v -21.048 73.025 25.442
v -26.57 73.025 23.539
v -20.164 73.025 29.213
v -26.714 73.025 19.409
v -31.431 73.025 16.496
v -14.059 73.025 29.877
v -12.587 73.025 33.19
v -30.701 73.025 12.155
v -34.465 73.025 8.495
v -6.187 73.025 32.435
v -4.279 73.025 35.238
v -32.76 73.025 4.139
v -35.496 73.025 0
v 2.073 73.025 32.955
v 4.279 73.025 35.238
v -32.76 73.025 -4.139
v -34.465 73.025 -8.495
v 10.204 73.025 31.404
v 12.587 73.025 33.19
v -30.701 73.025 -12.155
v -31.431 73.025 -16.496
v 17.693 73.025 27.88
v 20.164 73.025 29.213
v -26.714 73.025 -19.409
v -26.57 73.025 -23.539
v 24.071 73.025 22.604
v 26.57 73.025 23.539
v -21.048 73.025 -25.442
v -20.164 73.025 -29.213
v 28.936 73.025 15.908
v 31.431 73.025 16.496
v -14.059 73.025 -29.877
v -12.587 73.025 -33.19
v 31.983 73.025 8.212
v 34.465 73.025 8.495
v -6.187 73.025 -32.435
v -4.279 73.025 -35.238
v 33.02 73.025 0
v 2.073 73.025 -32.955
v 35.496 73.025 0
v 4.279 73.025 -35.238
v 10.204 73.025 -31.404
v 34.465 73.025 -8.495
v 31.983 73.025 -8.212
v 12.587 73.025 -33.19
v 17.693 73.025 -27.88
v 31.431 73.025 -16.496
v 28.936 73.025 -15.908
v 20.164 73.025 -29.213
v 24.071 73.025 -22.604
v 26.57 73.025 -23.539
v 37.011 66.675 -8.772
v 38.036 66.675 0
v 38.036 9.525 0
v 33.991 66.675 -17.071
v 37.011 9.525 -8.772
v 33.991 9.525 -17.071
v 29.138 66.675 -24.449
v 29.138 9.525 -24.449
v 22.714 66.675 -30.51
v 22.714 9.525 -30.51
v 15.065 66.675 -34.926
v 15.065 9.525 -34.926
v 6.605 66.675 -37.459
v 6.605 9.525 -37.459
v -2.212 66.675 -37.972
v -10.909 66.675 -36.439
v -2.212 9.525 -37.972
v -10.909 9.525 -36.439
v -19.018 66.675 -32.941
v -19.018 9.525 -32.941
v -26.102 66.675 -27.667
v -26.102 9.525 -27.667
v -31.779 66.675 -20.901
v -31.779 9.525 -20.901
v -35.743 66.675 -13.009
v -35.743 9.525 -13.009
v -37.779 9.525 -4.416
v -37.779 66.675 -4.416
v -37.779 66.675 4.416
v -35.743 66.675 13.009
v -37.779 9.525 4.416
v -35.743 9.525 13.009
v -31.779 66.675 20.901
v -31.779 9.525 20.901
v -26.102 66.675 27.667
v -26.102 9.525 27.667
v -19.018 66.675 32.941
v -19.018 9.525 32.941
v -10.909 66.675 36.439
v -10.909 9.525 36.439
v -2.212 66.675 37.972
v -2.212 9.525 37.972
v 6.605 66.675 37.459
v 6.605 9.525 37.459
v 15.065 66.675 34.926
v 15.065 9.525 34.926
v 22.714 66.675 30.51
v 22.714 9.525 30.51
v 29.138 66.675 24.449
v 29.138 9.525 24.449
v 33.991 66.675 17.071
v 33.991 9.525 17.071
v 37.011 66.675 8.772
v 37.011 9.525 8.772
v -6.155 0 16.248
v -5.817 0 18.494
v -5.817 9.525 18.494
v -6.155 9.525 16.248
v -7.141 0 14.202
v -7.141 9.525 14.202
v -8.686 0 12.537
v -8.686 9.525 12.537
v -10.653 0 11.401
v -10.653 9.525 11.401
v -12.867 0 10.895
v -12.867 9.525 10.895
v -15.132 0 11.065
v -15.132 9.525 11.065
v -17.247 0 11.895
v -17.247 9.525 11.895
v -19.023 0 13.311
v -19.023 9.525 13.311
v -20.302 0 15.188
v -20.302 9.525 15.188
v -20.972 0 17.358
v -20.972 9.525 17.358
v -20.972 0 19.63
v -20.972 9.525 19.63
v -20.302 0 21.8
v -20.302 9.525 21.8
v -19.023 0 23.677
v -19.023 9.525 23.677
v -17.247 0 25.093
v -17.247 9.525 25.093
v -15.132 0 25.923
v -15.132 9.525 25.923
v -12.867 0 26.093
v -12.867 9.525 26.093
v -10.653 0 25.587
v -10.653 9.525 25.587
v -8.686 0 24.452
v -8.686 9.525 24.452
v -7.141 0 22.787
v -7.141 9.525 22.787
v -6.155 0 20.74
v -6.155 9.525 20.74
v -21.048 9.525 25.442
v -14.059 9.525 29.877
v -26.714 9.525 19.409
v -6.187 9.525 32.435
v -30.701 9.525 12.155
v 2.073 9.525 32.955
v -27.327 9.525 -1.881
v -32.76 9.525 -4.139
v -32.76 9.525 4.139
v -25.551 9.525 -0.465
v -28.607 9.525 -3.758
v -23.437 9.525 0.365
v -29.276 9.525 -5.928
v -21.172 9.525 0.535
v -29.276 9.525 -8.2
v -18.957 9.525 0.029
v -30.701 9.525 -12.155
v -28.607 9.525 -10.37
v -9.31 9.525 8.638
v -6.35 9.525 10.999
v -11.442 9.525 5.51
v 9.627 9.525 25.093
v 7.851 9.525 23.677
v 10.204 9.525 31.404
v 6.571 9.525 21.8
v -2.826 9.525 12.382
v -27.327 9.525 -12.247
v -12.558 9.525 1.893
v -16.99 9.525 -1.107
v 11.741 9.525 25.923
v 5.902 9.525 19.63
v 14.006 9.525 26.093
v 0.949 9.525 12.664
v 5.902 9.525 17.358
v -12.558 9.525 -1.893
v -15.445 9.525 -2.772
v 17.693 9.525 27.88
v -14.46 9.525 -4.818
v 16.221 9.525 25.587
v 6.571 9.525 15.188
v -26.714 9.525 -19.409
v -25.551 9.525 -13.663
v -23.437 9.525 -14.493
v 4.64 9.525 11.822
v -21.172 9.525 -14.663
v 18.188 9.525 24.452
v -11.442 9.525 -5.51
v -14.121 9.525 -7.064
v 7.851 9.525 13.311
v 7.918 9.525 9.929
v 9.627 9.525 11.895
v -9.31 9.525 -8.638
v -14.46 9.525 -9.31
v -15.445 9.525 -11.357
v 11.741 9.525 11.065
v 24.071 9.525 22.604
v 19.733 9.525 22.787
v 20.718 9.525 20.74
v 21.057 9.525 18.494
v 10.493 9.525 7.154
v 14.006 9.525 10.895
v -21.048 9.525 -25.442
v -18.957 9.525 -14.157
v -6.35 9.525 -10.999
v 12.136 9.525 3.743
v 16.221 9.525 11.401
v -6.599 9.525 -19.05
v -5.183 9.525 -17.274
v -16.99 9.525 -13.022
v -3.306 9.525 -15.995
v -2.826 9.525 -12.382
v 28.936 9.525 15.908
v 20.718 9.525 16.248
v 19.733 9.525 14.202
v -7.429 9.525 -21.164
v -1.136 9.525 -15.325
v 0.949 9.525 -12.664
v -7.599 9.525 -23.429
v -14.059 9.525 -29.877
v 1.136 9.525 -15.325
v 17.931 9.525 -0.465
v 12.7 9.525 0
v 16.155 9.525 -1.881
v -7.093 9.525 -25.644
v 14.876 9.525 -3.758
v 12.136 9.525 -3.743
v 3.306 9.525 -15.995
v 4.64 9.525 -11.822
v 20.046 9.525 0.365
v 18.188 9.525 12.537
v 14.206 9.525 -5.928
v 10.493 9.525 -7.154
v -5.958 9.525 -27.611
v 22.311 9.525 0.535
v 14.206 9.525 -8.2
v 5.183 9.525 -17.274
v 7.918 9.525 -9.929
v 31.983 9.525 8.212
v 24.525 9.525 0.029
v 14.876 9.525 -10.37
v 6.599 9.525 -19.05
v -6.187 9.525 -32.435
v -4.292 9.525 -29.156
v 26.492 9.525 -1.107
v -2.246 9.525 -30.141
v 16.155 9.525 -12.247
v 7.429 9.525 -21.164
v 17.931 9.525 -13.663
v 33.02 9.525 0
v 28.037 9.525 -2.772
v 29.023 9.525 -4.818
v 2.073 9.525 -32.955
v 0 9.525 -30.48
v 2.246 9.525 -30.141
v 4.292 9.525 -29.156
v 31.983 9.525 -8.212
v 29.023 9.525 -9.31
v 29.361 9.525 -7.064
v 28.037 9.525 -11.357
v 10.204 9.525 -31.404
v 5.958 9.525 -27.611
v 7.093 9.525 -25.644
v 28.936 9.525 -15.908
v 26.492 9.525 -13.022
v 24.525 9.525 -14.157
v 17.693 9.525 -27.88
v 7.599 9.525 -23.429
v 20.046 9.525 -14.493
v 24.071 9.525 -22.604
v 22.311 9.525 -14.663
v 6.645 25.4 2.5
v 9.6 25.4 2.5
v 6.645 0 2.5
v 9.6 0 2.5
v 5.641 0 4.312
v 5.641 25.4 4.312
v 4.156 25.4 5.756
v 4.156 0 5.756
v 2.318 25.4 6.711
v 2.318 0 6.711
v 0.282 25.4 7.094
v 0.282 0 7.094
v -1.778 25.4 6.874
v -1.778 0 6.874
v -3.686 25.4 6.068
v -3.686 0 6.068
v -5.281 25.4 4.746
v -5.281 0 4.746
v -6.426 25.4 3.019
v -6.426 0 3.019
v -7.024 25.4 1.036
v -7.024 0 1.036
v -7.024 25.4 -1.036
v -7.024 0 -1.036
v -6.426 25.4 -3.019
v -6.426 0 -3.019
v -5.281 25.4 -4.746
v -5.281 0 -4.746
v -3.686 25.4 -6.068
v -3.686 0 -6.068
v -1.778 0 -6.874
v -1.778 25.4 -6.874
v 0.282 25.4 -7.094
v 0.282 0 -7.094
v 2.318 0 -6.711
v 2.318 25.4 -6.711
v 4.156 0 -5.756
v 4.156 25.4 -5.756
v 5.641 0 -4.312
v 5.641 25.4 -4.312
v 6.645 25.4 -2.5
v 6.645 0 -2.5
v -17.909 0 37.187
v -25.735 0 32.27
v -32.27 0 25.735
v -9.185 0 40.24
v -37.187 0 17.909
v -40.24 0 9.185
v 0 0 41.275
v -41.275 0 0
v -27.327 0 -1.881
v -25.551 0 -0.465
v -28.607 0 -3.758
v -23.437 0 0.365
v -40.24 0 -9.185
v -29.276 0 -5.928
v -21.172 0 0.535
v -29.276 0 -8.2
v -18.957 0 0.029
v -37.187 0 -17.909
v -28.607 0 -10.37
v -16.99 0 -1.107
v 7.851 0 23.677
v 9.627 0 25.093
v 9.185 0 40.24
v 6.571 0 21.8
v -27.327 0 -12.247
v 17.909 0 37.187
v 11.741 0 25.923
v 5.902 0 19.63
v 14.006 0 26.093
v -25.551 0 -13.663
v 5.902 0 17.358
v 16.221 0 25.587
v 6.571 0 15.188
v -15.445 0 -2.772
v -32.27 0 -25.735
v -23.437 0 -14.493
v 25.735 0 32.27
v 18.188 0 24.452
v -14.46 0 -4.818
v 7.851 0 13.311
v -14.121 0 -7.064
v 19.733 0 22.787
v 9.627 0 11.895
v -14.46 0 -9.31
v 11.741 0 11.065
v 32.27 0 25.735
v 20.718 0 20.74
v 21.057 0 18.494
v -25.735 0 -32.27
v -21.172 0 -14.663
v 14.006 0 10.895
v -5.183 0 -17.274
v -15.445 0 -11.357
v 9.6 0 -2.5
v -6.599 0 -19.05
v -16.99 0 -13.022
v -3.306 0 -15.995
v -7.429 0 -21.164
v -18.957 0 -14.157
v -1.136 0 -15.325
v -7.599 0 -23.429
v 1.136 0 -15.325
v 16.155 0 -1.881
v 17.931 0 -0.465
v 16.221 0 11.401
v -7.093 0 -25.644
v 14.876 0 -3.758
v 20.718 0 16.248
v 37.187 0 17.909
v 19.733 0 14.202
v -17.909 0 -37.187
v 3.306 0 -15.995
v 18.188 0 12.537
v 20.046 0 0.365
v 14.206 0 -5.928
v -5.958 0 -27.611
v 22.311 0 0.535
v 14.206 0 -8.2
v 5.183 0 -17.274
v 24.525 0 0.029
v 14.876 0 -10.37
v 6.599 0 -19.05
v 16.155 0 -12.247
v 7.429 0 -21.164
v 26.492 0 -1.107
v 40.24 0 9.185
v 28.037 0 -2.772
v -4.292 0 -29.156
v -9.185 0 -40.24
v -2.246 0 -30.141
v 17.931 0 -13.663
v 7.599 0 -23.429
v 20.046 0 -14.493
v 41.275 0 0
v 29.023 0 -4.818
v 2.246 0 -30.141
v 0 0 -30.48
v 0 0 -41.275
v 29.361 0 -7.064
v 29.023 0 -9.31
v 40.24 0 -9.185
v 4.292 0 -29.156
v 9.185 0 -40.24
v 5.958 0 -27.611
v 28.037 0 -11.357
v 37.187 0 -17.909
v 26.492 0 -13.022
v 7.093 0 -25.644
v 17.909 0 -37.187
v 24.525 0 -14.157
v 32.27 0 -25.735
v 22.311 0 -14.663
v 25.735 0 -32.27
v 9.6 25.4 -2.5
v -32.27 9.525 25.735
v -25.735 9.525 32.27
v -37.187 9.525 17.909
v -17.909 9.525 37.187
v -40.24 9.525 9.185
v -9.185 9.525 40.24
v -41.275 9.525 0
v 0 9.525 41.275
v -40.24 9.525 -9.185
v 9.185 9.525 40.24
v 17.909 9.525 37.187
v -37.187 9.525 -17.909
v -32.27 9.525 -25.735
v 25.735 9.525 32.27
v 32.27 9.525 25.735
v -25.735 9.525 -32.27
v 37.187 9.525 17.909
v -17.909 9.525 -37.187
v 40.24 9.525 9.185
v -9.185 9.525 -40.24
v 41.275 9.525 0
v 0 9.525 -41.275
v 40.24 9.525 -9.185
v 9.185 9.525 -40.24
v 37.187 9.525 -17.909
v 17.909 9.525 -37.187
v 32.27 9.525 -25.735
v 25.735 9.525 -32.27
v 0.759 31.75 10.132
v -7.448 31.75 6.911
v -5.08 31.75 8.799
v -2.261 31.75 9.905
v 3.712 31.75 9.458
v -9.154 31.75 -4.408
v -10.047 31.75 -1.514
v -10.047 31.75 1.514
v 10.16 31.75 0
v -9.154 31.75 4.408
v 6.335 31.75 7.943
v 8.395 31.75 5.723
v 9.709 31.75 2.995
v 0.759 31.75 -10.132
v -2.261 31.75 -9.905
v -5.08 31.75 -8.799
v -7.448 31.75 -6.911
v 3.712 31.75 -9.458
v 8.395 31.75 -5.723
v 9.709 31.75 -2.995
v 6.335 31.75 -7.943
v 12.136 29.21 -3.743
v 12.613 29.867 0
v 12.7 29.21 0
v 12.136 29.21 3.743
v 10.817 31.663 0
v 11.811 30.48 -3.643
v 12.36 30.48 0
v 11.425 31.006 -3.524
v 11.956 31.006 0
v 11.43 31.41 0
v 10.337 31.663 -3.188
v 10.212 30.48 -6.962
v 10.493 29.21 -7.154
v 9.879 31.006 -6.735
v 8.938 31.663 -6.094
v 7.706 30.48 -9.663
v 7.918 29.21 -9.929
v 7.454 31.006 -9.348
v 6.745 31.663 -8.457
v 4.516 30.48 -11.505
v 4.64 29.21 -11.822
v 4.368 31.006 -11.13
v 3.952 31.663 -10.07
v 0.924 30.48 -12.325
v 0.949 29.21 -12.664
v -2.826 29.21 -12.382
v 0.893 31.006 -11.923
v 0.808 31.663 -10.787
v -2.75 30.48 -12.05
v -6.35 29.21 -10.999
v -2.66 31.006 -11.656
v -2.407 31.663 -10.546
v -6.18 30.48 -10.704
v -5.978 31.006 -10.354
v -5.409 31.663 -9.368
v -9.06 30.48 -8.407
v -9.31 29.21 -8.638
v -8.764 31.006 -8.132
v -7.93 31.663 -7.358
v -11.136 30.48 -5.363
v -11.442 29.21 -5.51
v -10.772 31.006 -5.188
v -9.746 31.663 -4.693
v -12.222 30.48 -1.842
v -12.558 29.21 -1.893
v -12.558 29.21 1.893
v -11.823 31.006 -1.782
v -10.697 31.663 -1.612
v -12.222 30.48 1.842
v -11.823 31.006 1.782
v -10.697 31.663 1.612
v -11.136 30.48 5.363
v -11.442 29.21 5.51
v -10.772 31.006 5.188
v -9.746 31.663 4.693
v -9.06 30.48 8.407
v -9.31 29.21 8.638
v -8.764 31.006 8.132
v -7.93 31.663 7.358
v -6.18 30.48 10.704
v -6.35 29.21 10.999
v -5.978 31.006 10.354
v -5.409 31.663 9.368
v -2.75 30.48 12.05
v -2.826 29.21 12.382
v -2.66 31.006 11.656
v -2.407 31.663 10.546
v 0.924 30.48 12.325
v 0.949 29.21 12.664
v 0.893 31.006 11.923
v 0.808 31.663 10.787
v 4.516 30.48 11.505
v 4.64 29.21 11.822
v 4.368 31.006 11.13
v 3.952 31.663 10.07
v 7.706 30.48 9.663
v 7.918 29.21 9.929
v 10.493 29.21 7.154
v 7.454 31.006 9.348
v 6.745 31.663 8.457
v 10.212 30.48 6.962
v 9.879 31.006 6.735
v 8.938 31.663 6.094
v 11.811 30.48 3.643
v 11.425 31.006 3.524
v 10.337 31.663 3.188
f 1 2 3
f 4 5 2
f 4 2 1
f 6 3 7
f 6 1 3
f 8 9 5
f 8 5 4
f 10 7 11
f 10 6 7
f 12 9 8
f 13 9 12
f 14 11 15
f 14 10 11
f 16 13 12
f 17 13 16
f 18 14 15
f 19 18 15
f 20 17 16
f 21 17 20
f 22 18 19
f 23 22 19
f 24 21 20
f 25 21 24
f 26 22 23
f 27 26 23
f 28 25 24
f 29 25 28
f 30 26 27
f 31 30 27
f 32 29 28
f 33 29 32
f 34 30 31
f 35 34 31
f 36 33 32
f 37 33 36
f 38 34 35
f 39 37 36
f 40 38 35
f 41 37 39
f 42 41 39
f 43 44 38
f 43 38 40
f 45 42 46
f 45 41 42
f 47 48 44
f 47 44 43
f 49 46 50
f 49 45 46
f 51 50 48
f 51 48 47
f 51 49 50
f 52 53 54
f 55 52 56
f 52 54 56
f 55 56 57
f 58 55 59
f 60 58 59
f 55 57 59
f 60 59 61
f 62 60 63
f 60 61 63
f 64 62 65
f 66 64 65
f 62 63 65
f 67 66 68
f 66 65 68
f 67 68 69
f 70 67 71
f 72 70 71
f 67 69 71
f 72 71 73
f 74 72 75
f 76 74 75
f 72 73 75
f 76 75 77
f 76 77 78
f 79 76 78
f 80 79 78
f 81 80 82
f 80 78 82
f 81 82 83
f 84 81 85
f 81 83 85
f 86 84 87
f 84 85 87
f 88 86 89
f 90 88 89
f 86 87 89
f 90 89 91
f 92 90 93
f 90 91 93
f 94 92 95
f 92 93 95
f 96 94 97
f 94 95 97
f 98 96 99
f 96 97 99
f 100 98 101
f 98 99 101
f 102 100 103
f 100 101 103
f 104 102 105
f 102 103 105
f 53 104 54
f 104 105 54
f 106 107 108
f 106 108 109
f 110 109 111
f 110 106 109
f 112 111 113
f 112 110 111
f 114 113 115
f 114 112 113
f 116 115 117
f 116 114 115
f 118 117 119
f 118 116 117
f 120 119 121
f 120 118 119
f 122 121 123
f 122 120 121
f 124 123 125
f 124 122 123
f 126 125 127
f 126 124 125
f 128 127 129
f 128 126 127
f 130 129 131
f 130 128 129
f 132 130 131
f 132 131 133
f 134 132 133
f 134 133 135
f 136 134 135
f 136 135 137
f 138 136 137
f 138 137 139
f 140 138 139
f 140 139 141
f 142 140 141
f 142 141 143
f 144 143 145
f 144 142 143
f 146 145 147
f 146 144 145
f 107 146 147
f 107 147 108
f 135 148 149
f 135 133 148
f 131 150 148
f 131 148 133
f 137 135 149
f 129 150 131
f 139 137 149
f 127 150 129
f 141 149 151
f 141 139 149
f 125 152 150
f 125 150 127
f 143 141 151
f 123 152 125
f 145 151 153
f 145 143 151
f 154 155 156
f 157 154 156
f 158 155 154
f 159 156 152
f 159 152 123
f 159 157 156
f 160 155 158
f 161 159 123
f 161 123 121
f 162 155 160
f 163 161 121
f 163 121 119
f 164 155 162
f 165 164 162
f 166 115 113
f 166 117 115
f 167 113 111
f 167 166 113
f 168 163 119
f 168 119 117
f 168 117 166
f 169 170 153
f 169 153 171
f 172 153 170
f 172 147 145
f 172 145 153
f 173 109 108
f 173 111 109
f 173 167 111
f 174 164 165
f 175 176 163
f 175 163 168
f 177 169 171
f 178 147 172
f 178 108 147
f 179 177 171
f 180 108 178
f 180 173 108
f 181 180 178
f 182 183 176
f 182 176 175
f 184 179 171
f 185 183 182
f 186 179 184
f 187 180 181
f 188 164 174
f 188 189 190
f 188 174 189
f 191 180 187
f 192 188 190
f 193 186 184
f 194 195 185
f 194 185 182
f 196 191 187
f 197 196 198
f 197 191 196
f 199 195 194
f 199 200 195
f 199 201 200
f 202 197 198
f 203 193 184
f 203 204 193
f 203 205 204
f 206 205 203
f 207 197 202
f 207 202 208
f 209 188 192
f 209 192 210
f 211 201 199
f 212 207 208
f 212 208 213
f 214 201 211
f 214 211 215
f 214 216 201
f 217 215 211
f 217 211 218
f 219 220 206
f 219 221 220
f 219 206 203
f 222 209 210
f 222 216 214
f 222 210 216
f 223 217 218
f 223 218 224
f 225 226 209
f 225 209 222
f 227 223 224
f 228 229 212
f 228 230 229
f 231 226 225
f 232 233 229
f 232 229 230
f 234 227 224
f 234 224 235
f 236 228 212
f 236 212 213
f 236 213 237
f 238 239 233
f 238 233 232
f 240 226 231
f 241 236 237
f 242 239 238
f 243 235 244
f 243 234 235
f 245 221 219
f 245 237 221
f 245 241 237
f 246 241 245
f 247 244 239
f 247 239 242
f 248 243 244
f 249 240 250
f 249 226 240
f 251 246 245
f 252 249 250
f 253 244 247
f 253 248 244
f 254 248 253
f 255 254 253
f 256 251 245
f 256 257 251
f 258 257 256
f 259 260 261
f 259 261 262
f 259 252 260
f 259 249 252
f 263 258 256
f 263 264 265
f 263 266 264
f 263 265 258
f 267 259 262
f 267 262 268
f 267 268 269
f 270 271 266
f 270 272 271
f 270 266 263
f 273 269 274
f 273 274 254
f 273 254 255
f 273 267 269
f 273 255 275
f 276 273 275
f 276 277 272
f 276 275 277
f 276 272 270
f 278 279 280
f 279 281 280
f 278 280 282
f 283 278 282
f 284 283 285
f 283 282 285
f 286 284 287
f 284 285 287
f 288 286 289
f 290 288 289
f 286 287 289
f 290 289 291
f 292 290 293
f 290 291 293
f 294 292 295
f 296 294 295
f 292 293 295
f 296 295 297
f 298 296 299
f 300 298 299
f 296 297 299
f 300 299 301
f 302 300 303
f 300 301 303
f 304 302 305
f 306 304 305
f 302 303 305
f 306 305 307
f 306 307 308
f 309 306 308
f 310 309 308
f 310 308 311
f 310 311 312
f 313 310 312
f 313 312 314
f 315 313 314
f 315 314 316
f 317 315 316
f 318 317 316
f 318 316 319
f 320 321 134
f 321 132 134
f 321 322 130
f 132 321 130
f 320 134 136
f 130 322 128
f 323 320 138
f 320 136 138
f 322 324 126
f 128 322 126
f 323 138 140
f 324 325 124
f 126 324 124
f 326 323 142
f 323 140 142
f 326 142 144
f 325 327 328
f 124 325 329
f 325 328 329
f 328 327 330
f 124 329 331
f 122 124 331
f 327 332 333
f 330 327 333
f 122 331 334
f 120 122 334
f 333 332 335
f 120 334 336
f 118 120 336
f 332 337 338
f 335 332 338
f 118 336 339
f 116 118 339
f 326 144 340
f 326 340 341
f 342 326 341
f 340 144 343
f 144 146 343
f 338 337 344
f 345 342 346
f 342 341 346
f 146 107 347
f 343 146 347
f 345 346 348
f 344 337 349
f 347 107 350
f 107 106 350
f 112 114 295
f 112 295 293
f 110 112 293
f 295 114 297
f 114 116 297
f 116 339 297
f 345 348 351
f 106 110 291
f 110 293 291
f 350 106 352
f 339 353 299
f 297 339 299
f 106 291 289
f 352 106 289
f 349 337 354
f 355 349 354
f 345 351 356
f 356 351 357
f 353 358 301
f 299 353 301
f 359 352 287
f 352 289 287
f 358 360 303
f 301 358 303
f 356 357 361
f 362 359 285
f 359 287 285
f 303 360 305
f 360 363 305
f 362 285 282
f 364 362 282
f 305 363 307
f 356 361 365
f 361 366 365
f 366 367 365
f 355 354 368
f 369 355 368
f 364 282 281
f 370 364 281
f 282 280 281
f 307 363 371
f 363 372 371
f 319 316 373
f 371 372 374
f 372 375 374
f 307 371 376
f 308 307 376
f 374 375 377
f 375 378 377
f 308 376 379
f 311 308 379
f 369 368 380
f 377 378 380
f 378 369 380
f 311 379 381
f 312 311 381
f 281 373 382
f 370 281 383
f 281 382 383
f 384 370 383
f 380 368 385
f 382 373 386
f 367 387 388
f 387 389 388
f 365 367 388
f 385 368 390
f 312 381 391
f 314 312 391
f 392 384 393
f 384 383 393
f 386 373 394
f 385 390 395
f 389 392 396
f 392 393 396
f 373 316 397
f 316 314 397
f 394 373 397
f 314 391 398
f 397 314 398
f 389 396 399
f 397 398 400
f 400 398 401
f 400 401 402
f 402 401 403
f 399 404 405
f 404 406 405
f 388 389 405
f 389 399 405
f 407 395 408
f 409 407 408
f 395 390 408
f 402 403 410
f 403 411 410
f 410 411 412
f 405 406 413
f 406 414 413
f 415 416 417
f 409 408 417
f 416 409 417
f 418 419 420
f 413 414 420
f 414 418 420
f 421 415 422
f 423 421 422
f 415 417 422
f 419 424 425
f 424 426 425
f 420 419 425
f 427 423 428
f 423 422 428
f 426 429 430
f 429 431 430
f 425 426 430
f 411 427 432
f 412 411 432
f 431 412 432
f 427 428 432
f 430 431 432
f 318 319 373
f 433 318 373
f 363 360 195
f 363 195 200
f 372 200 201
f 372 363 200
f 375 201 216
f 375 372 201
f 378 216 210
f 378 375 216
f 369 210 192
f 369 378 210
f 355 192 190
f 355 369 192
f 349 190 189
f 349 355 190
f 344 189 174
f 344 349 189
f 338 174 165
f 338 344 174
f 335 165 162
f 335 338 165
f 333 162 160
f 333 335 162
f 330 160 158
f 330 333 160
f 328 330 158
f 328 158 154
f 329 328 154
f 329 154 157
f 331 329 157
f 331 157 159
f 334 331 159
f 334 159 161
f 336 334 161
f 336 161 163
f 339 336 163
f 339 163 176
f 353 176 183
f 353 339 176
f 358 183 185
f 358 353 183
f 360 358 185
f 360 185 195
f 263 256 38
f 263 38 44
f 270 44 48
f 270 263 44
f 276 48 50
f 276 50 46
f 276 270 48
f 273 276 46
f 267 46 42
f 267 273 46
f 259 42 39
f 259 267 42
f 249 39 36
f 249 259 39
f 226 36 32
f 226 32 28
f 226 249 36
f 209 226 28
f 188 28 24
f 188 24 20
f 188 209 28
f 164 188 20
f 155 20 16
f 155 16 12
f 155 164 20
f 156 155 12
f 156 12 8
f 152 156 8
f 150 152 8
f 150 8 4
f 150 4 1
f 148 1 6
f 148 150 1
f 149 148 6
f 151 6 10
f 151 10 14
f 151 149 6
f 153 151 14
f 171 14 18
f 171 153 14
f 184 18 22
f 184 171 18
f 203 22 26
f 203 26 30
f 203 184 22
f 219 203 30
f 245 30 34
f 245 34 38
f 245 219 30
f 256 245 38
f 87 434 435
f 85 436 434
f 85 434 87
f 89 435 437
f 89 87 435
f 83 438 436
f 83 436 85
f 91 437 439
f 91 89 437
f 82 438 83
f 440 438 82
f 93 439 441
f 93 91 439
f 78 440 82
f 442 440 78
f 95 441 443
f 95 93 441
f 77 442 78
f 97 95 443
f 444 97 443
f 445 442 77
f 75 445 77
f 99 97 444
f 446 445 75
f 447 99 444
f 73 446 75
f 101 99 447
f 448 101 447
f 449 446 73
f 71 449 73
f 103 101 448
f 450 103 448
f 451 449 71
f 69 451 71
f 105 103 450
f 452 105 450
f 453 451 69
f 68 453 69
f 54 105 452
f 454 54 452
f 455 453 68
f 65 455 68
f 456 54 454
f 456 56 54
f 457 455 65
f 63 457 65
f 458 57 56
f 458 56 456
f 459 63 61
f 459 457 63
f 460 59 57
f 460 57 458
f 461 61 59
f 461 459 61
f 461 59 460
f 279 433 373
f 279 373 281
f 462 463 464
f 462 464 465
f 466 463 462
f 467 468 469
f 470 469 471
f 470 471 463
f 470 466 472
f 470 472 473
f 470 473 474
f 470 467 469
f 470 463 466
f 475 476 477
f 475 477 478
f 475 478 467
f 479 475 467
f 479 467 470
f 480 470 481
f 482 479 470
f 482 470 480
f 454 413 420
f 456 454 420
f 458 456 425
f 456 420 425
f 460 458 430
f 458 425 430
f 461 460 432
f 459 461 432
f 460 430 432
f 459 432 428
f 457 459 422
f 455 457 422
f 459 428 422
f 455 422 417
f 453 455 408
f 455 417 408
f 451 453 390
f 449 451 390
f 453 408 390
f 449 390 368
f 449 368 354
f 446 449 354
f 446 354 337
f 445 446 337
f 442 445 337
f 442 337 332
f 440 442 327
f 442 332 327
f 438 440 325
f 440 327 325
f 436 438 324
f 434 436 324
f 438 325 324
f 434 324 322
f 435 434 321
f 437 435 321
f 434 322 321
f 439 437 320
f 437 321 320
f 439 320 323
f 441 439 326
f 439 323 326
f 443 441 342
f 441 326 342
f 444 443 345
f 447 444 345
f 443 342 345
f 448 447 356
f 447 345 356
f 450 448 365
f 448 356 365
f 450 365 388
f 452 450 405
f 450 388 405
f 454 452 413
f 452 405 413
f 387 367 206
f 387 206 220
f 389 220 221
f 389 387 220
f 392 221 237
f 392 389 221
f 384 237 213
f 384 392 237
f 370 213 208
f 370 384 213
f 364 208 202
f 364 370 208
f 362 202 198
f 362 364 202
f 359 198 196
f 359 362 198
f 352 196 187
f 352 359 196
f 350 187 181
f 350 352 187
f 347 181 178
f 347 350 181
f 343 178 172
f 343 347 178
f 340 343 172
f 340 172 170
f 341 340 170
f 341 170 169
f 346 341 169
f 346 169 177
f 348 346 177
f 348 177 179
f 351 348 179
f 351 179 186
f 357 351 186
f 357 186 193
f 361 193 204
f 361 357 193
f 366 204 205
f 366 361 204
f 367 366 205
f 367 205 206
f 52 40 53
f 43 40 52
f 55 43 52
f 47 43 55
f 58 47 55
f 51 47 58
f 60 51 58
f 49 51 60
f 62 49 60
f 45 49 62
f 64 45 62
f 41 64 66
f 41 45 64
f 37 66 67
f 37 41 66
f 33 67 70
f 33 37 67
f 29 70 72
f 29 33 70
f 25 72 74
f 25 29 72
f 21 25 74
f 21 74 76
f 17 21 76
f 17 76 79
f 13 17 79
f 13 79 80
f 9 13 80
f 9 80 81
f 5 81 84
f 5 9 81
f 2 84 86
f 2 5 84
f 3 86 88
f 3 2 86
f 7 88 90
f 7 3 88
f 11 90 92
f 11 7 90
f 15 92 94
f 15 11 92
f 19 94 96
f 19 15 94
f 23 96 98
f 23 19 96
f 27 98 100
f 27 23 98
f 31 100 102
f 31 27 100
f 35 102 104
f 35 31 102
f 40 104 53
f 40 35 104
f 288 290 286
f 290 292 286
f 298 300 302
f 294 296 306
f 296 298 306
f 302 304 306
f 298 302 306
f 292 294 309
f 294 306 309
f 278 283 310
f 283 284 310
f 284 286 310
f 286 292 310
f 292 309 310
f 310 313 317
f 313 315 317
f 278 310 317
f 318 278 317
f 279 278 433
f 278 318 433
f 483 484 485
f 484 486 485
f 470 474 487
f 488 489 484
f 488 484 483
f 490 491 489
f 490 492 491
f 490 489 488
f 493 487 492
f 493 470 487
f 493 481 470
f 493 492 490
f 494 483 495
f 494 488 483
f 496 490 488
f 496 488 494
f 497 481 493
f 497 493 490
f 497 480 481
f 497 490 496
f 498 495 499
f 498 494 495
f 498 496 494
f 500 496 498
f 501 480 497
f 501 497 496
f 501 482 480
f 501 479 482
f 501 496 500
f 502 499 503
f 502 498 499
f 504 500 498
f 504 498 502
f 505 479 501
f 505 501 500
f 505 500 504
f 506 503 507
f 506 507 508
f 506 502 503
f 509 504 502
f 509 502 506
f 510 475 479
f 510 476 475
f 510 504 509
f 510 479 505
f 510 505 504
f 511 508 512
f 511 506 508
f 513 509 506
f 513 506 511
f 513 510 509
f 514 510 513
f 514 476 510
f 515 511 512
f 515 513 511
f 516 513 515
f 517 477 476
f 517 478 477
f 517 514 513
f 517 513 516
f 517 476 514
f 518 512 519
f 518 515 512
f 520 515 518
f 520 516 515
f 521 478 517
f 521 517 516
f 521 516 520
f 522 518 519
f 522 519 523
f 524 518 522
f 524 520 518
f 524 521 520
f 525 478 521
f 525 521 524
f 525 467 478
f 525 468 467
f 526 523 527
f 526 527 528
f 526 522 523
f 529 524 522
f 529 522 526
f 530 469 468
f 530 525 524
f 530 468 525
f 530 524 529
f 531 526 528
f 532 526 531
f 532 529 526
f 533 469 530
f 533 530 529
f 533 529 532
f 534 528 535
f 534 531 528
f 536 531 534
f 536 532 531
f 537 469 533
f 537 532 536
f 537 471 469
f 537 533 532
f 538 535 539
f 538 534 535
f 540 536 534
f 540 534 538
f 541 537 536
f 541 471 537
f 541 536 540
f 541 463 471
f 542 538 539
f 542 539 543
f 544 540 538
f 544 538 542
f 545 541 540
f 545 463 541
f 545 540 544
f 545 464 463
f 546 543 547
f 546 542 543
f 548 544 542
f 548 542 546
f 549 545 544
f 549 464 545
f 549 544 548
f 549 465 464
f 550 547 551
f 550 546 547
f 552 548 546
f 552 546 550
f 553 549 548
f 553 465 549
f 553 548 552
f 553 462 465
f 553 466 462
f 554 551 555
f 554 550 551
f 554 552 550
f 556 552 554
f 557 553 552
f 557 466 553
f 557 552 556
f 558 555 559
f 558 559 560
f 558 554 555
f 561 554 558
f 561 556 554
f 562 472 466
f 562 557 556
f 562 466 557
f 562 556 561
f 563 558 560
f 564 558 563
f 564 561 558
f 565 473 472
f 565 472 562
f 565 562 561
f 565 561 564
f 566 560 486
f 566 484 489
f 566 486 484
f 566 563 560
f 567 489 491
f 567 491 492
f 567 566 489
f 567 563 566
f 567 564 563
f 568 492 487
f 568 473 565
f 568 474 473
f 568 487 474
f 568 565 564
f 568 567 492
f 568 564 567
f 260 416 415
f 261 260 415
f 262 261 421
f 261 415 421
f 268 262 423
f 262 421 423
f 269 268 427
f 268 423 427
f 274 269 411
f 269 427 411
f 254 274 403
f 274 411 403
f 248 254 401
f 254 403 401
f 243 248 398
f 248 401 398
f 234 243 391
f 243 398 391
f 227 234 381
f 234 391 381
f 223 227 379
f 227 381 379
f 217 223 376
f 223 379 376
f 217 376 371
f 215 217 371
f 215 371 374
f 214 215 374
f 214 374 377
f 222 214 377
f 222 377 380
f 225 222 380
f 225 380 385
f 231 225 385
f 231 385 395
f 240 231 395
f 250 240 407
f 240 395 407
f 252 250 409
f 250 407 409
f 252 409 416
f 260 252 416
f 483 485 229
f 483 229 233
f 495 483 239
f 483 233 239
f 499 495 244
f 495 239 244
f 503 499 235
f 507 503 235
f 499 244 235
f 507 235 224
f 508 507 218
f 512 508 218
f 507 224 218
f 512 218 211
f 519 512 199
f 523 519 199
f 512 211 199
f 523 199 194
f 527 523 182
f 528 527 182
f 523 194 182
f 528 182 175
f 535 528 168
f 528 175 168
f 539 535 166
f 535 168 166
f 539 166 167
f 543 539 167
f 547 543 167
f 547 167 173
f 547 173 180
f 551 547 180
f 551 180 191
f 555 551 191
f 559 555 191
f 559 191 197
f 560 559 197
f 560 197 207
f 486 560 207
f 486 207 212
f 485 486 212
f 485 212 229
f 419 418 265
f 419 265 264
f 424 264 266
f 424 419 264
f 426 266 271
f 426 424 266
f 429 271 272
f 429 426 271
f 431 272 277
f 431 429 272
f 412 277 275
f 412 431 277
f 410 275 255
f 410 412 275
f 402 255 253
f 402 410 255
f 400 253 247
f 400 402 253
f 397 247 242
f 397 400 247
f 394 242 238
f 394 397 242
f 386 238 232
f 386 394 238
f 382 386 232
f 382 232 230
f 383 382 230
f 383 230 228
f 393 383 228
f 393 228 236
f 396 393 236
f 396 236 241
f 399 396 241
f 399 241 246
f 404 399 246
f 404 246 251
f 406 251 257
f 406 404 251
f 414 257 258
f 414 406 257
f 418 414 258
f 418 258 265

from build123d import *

# Parameters (mm, degrees)
SKETCH1_R           = 41.275
SKETCH1_R_2         = 7.62
BOSS_EXTRUDE1_DEPTH = 9.525
SKETCH2_R           = 38.0365
SKETCH2_R_2         = 33.02
BOSS_EXTRUDE2_DEPTH = 63.5
SKETCH3_R           = 12.7
BOSS_EXTRUDE3_DEPTH = 15.875
CHAMFER1_SIZE       = 6.35
CHAMFER1_SIZE2      = 2.54
SKETCH4_R           = 12.7
BOSS_EXTRUDE4_DEPTH = 6.35
FILLET1_R           = 2.54


with BuildPart() as part:
    # Sketch1 → Boss-Extrude1 (new body)
    with BuildSketch(Plane(origin=(0, 0, 0), x_dir=(1, 0, 0), z_dir=(0, 1, 0))):
        Circle(SKETCH1_R)
        with Locations((-13.436770867, -18.494128491)):
            Circle(SKETCH1_R_2, mode=Mode.SUBTRACT)
        with Locations((13.436770867, -18.494128491)):
            Circle(SKETCH1_R_2, mode=Mode.SUBTRACT)
        with BuildLine():
            Line((9.6, -2.5), (6.64529909, -2.5))
            ThreePointArc((6.64529909, -2.5), (-7.1, 0), (6.64529909, 2.5))
            Line((6.64529909, 2.5), (9.6, 2.5))
            Line((9.6, 2.5), (9.6, -2.5))
        make_face(mode=Mode.SUBTRACT)
        with Locations((-21.741151963, 7.064128491)):
            Circle(SKETCH1_R_2, mode=Mode.SUBTRACT)
        with BuildLine():
            ThreePointArc((0, 15.24), (-7.62, 22.86), (0, 30.48))
            ThreePointArc((0, 30.48), (7.62, 22.86), (0, 15.24))
        make_face(mode=Mode.SUBTRACT)
        with Locations((21.741151963, 7.064128491)):
            Circle(SKETCH1_R_2, mode=Mode.SUBTRACT)
    extrude(amount=BOSS_EXTRUDE1_DEPTH)

    # Sketch2 → Boss-Extrude2 (add)
    with BuildSketch(Plane(origin=(0, 9.525, 0), x_dir=(1, 0, 0), z_dir=(0, 1, 0))):
        Circle(SKETCH2_R)
        Circle(SKETCH2_R_2, mode=Mode.SUBTRACT)
    extrude(amount=BOSS_EXTRUDE2_DEPTH)

    # Sketch3 → Boss-Extrude3 (add)
    with BuildSketch(Plane(origin=(0, 9.525, 0), x_dir=(1, 0, 0), z_dir=(0, 1, 0))):
        Circle(SKETCH3_R)
        with BuildLine():
            Line((9.6, -2.5), (6.64529909, -2.5))
            ThreePointArc((6.64529909, -2.5), (-7.1, 0), (6.64529909, 2.5))
            Line((6.64529909, 2.5), (9.6, 2.5))
            Line((9.6, 2.5), (9.6, -2.5))
        make_face(mode=Mode.SUBTRACT)
    extrude(amount=BOSS_EXTRUDE3_DEPTH)

    # Chamfer1
    chamfer1_edges = [part.edges().sort_by_distance(p)[0] for p in [
        (-38.0365, 73.025, 0),
    ]]
    chamfer1_side = [part.faces().sort_by_distance(p)[0] for p in [
        (-38.0365, 41.275, 0),
    ]]
    chamfer(chamfer1_edges, length=CHAMFER1_SIZE, length2=CHAMFER1_SIZE2, reference=chamfer1_side[0])

    # Sketch4 → Boss-Extrude4 (add)
    with BuildSketch(Plane(origin=(0, 25.4, 0), x_dir=(1, 0, 0), z_dir=(0, 1, 0))):
        Circle(SKETCH4_R)
    extrude(amount=BOSS_EXTRUDE4_DEPTH)

    # Fillet1
    fillet1_edges = [part.edges().sort_by_distance(p)[0] for p in [
        (-12.7, 31.75, 0),
    ]]
    fillet(fillet1_edges, radius=FILLET1_R)


solid = part.part
